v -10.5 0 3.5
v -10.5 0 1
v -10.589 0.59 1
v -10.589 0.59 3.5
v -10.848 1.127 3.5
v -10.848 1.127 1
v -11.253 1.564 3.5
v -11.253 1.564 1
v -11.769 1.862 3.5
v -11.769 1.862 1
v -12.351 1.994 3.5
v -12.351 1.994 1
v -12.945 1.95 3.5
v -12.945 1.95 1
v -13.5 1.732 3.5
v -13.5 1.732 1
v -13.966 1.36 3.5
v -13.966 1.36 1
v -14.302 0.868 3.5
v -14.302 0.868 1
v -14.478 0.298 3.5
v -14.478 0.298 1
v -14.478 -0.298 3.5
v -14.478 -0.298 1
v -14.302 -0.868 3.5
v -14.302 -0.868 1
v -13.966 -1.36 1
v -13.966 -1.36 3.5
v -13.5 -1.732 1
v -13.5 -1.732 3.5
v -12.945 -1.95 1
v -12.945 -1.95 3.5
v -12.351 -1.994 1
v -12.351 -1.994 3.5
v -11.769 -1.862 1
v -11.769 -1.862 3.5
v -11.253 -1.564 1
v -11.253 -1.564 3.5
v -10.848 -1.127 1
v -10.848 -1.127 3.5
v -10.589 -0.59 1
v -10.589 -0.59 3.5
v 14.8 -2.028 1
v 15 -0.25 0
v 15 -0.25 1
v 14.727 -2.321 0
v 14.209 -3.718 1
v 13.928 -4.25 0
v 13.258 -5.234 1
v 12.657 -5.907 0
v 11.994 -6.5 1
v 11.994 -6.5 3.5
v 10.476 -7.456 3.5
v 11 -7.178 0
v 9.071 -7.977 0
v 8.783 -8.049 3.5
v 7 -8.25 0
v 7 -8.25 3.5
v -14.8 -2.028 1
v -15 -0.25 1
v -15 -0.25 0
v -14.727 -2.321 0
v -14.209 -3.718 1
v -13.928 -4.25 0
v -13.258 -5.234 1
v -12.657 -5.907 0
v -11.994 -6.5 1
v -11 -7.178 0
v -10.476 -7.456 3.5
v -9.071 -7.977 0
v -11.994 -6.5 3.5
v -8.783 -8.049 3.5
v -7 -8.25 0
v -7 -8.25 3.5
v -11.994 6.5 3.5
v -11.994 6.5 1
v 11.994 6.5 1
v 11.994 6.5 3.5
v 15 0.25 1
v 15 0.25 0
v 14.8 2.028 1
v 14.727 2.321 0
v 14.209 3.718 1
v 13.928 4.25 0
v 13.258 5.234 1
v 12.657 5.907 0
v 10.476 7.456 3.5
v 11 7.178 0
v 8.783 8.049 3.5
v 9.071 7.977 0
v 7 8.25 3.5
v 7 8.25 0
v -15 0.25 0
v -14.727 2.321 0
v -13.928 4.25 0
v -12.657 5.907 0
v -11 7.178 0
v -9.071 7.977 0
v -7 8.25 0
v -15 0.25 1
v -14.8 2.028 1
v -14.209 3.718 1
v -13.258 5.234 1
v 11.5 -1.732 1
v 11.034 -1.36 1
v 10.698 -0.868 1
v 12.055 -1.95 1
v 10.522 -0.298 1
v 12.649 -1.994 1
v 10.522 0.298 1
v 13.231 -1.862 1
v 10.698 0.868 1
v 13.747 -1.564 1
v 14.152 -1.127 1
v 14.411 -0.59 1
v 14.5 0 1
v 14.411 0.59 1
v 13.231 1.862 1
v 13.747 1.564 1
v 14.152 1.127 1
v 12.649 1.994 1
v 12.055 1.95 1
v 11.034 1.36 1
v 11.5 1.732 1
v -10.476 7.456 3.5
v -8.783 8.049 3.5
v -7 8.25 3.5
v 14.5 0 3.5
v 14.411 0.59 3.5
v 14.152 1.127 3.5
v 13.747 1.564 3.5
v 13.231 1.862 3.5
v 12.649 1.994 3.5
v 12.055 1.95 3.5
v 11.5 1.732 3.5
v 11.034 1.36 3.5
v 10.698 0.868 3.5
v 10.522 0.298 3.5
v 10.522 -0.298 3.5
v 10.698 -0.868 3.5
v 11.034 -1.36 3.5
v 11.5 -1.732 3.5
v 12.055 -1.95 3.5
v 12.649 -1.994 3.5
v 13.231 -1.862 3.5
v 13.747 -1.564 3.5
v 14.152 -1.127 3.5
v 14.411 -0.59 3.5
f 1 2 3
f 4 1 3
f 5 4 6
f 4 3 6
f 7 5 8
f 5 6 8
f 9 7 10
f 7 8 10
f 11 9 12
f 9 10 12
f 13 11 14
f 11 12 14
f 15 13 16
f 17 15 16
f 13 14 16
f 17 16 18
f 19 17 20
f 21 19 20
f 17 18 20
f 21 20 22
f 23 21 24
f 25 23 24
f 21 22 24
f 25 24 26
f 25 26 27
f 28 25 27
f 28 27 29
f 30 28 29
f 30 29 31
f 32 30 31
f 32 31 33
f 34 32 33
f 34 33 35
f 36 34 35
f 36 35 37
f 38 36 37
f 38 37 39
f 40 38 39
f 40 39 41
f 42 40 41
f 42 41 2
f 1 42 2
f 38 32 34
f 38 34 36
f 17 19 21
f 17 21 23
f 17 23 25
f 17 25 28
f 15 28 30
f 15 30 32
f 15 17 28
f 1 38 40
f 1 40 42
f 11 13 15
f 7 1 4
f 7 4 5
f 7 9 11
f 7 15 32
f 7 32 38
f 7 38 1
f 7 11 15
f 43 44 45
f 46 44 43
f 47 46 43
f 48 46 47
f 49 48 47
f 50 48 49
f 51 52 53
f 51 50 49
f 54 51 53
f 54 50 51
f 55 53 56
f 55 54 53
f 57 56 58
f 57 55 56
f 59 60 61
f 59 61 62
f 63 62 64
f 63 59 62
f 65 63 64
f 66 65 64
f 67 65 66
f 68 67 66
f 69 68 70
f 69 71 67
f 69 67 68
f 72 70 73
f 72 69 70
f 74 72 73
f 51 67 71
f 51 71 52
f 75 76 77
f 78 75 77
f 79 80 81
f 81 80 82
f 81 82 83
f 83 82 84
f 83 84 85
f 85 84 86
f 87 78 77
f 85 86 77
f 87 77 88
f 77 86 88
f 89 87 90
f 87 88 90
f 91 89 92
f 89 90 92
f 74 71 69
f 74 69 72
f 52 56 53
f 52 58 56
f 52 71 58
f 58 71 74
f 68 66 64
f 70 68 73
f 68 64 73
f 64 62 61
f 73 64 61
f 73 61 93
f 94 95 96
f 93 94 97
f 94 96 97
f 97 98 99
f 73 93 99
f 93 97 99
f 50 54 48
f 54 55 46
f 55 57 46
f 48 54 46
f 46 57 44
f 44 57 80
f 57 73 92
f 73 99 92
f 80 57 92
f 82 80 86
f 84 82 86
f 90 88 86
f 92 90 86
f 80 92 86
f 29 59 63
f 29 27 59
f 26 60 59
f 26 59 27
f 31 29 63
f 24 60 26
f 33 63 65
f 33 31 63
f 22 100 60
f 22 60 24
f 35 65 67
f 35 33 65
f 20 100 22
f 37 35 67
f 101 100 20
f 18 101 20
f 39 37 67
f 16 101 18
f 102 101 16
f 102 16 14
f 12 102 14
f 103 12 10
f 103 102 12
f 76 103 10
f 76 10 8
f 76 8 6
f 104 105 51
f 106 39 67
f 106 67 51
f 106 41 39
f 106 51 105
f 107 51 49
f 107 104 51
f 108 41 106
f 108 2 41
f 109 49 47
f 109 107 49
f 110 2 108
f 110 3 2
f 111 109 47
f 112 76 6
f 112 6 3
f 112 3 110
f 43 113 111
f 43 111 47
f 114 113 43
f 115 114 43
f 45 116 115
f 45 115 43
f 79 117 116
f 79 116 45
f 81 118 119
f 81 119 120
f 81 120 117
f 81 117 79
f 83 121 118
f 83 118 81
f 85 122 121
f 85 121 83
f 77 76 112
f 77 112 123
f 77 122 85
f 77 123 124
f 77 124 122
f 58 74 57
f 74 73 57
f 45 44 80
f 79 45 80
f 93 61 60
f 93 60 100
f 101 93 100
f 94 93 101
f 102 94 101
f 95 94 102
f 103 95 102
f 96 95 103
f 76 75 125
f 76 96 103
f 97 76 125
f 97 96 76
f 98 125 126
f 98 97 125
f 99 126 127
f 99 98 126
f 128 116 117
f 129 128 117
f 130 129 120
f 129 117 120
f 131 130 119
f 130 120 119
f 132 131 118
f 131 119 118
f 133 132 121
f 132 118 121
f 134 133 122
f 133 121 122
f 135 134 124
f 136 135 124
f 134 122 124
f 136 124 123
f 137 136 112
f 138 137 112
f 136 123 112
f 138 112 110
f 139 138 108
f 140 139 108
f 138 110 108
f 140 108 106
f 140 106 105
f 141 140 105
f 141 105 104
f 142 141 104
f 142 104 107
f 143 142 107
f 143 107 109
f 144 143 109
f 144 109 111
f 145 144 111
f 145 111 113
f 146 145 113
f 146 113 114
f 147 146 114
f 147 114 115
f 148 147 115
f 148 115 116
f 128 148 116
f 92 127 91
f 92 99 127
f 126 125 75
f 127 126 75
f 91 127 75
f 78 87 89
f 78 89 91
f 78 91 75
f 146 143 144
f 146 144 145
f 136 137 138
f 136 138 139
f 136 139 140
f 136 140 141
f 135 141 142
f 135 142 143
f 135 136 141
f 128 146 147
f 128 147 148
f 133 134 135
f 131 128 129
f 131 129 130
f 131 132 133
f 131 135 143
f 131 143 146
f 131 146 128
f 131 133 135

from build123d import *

# Parameters (mm, degrees)
F0_W     = 30
F0_H     = 16.5
F0_R     = 2
F1_DEPTH = 1
F2_DEPTH = 3.5
F3_W     = 30
F3_H     = 1.75
F4_DEPTH = 2.5
F5_R     = 8


with BuildPart() as f1:
    # F0 (on Top) → F1 (new body)
    with BuildSketch(Plane.XY):
        Rectangle(F0_W, F0_H)
        with Locations((-12.5, 0)):
            Circle(F0_R, mode=Mode.SUBTRACT)
        with Locations((12.5, 0)):
            Circle(F0_R, mode=Mode.SUBTRACT)
        with Locations((-12.5, 0)):
            Circle(F0_R)
        with Locations((12.5, 0)):
            Circle(F0_R)
    extrude(amount=F1_DEPTH)

    # F0 (on Top) → F2 (join)
    with BuildSketch(Plane.XY):
        with Locations((-12.5, 0)):
            Circle(F0_R)
        with Locations((12.5, 0)):
            Circle(F0_R)
    extrude(amount=F2_DEPTH)

    # F3 (on face) → F4 (join)
    with BuildSketch(Plane.XY.offset(1)):
        with Locations((0, 7.375)):
            Rectangle(F3_W, F3_H)
        with Locations((0, -7.375)):
            Rectangle(F3_W, F3_H)
    extrude(amount=F4_DEPTH)

    # F5
    f5_edges = [f1.edges().sort_by_distance(p)[0] for p in [
        (-15, -8.25, 1.75),
        (-15, 8.25, 1.75),
        (15, -8.25, 1.75),
        (15, 8.25, 1.75),
    ]]
    fillet(f5_edges, radius=F5_R)


solid = f1.part
